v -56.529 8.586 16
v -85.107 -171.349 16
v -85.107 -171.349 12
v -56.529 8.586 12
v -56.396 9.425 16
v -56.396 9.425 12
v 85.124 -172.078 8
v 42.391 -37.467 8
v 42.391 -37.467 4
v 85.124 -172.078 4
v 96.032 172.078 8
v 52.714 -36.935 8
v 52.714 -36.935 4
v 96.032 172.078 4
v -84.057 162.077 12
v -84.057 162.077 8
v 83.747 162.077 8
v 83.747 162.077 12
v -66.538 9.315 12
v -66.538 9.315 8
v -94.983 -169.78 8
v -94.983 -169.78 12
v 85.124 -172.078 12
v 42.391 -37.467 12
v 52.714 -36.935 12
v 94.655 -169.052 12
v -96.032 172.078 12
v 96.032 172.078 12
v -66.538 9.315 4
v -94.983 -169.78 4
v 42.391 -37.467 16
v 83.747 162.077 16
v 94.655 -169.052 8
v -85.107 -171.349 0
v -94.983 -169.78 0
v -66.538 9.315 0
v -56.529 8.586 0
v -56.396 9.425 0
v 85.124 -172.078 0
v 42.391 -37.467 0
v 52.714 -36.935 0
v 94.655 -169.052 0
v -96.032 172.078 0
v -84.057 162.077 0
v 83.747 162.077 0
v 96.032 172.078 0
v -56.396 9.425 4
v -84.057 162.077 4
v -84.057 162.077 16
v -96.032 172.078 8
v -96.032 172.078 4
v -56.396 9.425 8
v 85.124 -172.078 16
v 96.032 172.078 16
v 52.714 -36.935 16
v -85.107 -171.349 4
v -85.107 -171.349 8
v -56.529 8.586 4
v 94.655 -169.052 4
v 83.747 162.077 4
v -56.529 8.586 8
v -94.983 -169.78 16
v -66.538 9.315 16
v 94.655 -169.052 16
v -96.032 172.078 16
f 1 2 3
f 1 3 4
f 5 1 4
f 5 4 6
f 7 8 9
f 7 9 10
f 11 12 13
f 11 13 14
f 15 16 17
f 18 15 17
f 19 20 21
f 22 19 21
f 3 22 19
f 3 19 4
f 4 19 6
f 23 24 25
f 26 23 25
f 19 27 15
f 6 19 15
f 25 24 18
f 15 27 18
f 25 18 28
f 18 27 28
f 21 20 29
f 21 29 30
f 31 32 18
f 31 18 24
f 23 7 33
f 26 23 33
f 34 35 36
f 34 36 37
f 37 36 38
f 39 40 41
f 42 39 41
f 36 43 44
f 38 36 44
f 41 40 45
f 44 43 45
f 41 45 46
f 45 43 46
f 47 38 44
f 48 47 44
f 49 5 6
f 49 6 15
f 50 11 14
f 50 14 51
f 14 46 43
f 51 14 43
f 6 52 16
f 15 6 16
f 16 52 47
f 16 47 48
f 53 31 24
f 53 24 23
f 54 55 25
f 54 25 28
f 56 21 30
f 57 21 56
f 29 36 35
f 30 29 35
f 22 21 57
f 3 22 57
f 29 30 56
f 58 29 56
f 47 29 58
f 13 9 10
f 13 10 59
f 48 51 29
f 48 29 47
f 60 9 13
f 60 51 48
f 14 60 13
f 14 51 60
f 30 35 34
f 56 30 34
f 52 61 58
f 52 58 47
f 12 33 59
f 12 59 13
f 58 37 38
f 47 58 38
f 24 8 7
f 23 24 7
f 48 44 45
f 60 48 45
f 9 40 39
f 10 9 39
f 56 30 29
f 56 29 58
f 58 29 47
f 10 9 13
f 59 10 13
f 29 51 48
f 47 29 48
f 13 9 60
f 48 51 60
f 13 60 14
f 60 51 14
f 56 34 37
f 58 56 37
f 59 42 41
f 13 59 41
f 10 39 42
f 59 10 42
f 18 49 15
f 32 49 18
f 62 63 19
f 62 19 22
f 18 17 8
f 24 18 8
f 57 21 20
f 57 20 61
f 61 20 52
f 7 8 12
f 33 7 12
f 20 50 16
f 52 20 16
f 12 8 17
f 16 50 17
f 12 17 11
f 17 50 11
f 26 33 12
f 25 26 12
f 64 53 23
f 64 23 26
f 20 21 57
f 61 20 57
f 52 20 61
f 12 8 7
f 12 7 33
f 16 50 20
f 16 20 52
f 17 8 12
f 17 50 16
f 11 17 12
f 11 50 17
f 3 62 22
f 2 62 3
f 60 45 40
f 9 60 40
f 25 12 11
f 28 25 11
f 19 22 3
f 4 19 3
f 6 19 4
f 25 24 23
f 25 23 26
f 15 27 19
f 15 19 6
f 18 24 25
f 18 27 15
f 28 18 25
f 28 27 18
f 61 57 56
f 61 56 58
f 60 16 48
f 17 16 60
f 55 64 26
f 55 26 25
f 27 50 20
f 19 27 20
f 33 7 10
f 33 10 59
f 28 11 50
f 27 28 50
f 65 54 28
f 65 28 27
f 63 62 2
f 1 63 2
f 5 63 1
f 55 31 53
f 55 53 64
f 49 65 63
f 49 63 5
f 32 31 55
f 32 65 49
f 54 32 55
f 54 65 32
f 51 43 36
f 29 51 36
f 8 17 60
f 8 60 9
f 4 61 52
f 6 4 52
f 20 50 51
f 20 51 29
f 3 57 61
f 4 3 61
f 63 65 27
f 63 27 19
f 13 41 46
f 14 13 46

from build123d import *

# Parameters (mm, degrees)
F1_DEPTH = 4


with BuildPart() as f1:
    # F0 (on Top) → F1 (new body)
    with BuildSketch(Plane.XY):
        Polygon((42.39078, -37.467309), (85.124089, -172.077525), (94.65529, -169.052042), (52.713664, -36.935041), (96.032295, 172.077524), (-96.032295, 172.077524), (-66.538488, 9.314676), (-94.983091, -169.780335), (-85.106864, -171.349231), (-56.528935, 8.585694), (-56.395782, 9.425092), (-84.057488, 162.077445), (83.747085, 162.077445), align=None)
    extrude(amount=F1_DEPTH)


with BuildPart() as f2_1:
    # F2: instance of F1
    add(f1.part.mirror(Plane(origin=(-2.3035039063, 32.7912756396, 4), x_dir=(1, 0, 0), z_dir=(0, 0, 1))))


with BuildPart() as f3_1:
    # F3: instance of F2_1
    add(f2_1.part.mirror(Plane(origin=(-2.3035039063, 32.7912756396, 8), x_dir=(1, 0, 0), z_dir=(0, 0, 1))))


with BuildPart() as f3_2:
    # F3: instance of F1
    add(f1.part.mirror(Plane(origin=(-2.3035039063, 32.7912756396, 8), x_dir=(1, 0, 0), z_dir=(0, 0, 1))))


solid = Compound([f1.part, f2_1.part, f3_1.part, f3_2.part])
